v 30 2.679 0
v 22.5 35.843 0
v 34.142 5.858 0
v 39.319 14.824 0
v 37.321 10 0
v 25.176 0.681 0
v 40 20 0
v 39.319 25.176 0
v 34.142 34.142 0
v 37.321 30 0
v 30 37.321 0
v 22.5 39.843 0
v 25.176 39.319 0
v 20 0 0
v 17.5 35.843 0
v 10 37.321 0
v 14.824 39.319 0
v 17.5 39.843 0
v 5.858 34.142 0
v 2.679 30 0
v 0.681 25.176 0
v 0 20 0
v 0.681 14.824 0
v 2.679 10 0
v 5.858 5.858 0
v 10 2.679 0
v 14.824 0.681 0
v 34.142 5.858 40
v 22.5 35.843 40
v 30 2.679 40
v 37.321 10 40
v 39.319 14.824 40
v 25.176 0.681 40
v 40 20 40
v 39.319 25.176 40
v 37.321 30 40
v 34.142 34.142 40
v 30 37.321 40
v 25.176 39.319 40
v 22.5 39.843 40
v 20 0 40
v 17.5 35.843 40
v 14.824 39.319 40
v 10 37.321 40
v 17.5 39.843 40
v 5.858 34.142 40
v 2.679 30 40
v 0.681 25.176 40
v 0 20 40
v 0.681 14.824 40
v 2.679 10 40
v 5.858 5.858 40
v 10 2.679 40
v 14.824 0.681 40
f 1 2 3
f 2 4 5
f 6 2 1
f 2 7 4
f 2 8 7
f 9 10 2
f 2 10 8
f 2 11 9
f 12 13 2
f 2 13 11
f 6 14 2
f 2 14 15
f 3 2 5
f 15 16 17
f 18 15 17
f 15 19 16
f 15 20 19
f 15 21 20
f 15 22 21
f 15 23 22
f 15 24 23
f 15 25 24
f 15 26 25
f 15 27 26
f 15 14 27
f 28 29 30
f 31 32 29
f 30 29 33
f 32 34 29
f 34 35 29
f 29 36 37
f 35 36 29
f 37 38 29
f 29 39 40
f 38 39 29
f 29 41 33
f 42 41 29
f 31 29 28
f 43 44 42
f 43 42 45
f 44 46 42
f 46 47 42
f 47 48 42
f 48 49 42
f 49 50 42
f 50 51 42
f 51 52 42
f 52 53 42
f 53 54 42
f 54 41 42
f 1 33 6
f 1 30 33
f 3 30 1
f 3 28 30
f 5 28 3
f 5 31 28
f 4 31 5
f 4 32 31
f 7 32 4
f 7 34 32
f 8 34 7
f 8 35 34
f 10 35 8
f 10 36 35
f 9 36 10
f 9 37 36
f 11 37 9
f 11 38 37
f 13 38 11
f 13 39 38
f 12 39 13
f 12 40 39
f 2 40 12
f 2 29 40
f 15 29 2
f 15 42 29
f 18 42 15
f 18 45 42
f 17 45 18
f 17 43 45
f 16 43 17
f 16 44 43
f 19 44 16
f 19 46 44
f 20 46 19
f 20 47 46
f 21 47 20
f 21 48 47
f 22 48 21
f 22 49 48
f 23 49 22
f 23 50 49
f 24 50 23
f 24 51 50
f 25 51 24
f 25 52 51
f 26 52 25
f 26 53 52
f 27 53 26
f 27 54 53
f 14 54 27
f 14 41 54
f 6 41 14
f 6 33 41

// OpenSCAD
$fn = 32;

// ----------------------------------------------------------------------
// Keyway shaft: d40 shaft, key 5 x 4 mm
// ----------------------------------------------------------------------

// --- parameters (mm) ---
shaft_r = 20;             // shaft radius
key_w = 5;                // keyway width
key_d = 4;                // keyway depth below the surface line
plate_t = 40;             // shaft length, Z (extrusion height)

shaft_d = 2 * shaft_r;  // shaft diameter
circle_step = 15;  // polygon sampling step, degrees

profile = [[14.824, 39.319], [10, 37.321], [5.858, 34.142], [2.679, 30], [0.681, 25.176], [0, 20], [0.681, 14.824], [2.679, 10], [5.858, 5.858], [10, 2.679], [14.824, 0.681], [20, 0], [25.176, 0.681], [30, 2.679], [34.142, 5.858], [37.321, 10], [39.319, 14.824], [40, 20], [39.319, 25.176], [37.321, 30], [34.142, 34.142], [30, 37.321], [25.176, 39.319], [22.5, 39.843], [22.5, 35.843], [17.5, 35.843], [17.5, 39.843]];  // primary outline, 27 points, counter clockwise

// --- the one profile operation ---
linear_extrude(height = plate_t) polygon(points = profile);
